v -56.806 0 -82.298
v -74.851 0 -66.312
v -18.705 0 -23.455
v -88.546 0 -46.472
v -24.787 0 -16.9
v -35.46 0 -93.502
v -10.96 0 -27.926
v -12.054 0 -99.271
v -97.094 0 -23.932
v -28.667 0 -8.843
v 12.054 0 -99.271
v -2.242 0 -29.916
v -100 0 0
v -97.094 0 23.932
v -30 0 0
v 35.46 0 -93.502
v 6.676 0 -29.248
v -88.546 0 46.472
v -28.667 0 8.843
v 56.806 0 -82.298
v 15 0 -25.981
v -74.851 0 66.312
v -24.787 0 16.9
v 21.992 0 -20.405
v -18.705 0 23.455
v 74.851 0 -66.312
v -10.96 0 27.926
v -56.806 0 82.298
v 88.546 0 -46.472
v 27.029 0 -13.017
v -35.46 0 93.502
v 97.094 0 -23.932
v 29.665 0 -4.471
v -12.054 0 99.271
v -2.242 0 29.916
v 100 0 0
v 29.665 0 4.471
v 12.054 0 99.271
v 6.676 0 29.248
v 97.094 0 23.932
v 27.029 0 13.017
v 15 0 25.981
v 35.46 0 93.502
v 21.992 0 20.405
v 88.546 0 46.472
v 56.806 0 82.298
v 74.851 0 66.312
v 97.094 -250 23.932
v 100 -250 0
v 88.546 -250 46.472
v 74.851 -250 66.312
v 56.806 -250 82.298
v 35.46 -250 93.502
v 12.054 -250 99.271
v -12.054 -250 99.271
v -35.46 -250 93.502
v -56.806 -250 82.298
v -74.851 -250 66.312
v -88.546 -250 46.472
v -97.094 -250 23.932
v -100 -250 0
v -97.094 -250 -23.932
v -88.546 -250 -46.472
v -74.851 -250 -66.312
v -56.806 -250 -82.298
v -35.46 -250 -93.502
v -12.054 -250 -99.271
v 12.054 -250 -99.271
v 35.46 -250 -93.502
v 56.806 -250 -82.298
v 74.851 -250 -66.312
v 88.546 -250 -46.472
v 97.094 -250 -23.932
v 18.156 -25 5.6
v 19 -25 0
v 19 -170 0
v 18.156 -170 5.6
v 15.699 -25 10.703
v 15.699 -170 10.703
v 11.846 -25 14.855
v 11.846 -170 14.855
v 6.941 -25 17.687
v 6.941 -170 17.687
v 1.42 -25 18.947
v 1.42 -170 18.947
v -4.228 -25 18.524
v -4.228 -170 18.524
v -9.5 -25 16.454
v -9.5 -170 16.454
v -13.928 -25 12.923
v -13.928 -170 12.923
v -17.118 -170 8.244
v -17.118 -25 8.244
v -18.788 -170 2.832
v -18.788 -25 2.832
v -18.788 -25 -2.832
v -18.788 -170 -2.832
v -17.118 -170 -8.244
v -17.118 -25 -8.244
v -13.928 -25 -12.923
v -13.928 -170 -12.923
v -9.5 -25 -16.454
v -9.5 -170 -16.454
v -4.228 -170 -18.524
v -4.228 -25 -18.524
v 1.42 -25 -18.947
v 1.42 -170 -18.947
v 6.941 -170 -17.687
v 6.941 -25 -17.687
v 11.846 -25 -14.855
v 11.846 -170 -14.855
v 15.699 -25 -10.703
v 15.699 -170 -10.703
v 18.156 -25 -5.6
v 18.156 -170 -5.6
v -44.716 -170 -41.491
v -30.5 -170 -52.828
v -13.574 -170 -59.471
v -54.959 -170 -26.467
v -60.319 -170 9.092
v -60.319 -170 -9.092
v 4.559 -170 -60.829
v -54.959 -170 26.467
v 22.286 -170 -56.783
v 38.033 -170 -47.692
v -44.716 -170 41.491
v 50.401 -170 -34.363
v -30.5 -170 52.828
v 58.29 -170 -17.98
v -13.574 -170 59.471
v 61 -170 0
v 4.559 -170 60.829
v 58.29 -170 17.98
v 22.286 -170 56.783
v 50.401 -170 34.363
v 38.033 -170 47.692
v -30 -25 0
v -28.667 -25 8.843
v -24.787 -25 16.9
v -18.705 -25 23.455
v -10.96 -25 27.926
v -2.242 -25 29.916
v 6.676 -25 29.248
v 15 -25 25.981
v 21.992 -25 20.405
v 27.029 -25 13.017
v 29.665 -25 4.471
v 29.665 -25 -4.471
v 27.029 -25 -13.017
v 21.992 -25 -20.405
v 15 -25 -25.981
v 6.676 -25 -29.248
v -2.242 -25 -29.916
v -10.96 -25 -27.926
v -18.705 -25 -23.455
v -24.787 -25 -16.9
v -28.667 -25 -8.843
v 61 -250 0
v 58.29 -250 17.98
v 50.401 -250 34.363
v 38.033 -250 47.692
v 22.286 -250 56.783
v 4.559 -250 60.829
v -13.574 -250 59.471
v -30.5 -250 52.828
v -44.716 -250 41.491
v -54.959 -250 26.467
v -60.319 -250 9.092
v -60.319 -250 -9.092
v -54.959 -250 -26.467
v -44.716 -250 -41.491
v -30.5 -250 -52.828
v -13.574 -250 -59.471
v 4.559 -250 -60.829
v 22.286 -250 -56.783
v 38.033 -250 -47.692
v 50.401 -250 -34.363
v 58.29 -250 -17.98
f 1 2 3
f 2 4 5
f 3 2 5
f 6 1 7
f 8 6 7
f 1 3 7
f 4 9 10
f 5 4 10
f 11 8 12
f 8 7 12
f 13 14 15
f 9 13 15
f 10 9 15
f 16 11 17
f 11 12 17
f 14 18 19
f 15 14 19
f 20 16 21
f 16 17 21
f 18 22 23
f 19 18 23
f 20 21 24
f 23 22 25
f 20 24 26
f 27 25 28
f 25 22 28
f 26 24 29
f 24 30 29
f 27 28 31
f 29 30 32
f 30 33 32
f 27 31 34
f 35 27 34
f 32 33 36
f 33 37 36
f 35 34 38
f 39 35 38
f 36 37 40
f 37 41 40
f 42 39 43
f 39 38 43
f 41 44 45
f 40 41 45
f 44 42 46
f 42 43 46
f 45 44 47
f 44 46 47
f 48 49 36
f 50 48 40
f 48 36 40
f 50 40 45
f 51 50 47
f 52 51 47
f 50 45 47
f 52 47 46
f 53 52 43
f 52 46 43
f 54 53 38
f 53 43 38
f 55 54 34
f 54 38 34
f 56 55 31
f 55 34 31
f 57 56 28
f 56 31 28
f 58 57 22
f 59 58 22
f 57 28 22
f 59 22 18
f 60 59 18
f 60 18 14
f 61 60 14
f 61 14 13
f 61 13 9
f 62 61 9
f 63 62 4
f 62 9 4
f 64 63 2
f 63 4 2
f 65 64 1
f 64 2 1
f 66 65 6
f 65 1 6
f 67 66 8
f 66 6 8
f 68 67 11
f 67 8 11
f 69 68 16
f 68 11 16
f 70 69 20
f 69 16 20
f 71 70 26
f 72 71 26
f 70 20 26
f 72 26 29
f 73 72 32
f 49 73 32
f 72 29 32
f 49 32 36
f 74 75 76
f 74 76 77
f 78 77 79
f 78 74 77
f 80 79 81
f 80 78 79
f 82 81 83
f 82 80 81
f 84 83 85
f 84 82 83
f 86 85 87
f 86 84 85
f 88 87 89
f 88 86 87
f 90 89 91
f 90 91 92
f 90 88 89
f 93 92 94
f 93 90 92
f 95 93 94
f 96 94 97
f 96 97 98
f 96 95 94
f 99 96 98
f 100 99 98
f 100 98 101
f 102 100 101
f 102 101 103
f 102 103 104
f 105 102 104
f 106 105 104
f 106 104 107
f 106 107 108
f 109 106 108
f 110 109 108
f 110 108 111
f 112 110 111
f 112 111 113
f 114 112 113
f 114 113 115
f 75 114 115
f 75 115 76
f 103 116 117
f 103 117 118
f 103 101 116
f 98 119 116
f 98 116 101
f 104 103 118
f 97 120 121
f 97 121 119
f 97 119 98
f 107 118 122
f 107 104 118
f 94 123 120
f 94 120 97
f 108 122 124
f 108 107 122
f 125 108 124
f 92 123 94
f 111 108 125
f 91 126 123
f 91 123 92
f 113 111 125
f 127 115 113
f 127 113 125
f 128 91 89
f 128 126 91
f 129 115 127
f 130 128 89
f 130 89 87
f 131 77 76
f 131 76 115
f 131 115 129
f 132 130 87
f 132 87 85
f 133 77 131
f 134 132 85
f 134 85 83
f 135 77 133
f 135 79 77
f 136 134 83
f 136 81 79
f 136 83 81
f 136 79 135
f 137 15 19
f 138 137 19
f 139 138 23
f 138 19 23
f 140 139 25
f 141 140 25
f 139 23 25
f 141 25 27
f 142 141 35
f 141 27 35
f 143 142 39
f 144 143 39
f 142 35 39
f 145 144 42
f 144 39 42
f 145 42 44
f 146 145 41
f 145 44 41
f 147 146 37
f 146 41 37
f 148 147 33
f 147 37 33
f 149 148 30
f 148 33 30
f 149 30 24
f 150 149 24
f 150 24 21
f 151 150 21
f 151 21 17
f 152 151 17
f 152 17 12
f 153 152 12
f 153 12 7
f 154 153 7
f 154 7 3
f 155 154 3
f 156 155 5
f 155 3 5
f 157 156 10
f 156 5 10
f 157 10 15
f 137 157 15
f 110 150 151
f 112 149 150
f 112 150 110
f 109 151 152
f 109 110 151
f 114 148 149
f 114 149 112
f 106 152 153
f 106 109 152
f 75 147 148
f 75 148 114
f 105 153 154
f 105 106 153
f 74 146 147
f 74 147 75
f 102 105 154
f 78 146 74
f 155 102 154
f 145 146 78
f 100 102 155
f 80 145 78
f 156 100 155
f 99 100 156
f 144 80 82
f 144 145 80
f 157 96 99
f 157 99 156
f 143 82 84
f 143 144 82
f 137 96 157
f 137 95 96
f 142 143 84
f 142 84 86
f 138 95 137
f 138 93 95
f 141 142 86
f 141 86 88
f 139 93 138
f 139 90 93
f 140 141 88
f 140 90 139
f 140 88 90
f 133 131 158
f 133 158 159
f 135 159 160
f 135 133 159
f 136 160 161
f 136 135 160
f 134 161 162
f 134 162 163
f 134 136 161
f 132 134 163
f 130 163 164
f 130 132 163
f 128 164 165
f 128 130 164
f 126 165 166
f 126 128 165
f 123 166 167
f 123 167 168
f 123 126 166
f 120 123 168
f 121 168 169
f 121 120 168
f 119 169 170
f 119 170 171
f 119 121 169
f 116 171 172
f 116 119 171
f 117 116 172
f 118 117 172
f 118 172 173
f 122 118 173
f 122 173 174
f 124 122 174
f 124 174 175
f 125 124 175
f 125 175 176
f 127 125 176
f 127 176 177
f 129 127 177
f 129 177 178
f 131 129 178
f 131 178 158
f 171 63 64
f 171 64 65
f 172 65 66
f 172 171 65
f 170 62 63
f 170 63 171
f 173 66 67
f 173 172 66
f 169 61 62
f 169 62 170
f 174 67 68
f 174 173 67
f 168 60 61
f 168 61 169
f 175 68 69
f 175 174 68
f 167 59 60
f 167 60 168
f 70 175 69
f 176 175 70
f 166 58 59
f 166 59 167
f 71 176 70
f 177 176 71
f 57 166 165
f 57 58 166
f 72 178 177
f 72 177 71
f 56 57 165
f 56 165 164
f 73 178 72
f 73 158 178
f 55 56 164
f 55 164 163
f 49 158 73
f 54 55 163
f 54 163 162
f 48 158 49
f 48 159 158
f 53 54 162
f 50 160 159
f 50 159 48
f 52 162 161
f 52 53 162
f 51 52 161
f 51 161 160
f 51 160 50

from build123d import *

# Parameters (mm, degrees)
F0_R     = 100
F0_R_2   = 61
F1_DEPTH = 250
F0_R_3   = 19
F2_DEPTH = 170
F3_R     = 30
F3_R_2   = 19
F4_DEPTH = 25


with BuildPart() as f1:
    # F0 (on Front) → F1 (new body)
    with BuildSketch(Plane.XZ):
        Circle(F0_R)
        Circle(F0_R_2, mode=Mode.SUBTRACT)
    extrude(amount=F1_DEPTH)

    # F0 (on Front) → F2 (join)
    with BuildSketch(Plane.XZ):
        Circle(F0_R_2)
        Circle(F0_R_3, mode=Mode.SUBTRACT)
    extrude(amount=F2_DEPTH)

    # F3 (on face) → F4 (cut)
    with BuildSketch(Plane(origin=(0, 0, 0), x_dir=(-1, 0, 0), z_dir=(0, 1, 0))):
        Circle(F3_R)
        Circle(F3_R_2, mode=Mode.SUBTRACT)
    extrude(amount=-F4_DEPTH, mode=Mode.SUBTRACT)


solid = f1.part
